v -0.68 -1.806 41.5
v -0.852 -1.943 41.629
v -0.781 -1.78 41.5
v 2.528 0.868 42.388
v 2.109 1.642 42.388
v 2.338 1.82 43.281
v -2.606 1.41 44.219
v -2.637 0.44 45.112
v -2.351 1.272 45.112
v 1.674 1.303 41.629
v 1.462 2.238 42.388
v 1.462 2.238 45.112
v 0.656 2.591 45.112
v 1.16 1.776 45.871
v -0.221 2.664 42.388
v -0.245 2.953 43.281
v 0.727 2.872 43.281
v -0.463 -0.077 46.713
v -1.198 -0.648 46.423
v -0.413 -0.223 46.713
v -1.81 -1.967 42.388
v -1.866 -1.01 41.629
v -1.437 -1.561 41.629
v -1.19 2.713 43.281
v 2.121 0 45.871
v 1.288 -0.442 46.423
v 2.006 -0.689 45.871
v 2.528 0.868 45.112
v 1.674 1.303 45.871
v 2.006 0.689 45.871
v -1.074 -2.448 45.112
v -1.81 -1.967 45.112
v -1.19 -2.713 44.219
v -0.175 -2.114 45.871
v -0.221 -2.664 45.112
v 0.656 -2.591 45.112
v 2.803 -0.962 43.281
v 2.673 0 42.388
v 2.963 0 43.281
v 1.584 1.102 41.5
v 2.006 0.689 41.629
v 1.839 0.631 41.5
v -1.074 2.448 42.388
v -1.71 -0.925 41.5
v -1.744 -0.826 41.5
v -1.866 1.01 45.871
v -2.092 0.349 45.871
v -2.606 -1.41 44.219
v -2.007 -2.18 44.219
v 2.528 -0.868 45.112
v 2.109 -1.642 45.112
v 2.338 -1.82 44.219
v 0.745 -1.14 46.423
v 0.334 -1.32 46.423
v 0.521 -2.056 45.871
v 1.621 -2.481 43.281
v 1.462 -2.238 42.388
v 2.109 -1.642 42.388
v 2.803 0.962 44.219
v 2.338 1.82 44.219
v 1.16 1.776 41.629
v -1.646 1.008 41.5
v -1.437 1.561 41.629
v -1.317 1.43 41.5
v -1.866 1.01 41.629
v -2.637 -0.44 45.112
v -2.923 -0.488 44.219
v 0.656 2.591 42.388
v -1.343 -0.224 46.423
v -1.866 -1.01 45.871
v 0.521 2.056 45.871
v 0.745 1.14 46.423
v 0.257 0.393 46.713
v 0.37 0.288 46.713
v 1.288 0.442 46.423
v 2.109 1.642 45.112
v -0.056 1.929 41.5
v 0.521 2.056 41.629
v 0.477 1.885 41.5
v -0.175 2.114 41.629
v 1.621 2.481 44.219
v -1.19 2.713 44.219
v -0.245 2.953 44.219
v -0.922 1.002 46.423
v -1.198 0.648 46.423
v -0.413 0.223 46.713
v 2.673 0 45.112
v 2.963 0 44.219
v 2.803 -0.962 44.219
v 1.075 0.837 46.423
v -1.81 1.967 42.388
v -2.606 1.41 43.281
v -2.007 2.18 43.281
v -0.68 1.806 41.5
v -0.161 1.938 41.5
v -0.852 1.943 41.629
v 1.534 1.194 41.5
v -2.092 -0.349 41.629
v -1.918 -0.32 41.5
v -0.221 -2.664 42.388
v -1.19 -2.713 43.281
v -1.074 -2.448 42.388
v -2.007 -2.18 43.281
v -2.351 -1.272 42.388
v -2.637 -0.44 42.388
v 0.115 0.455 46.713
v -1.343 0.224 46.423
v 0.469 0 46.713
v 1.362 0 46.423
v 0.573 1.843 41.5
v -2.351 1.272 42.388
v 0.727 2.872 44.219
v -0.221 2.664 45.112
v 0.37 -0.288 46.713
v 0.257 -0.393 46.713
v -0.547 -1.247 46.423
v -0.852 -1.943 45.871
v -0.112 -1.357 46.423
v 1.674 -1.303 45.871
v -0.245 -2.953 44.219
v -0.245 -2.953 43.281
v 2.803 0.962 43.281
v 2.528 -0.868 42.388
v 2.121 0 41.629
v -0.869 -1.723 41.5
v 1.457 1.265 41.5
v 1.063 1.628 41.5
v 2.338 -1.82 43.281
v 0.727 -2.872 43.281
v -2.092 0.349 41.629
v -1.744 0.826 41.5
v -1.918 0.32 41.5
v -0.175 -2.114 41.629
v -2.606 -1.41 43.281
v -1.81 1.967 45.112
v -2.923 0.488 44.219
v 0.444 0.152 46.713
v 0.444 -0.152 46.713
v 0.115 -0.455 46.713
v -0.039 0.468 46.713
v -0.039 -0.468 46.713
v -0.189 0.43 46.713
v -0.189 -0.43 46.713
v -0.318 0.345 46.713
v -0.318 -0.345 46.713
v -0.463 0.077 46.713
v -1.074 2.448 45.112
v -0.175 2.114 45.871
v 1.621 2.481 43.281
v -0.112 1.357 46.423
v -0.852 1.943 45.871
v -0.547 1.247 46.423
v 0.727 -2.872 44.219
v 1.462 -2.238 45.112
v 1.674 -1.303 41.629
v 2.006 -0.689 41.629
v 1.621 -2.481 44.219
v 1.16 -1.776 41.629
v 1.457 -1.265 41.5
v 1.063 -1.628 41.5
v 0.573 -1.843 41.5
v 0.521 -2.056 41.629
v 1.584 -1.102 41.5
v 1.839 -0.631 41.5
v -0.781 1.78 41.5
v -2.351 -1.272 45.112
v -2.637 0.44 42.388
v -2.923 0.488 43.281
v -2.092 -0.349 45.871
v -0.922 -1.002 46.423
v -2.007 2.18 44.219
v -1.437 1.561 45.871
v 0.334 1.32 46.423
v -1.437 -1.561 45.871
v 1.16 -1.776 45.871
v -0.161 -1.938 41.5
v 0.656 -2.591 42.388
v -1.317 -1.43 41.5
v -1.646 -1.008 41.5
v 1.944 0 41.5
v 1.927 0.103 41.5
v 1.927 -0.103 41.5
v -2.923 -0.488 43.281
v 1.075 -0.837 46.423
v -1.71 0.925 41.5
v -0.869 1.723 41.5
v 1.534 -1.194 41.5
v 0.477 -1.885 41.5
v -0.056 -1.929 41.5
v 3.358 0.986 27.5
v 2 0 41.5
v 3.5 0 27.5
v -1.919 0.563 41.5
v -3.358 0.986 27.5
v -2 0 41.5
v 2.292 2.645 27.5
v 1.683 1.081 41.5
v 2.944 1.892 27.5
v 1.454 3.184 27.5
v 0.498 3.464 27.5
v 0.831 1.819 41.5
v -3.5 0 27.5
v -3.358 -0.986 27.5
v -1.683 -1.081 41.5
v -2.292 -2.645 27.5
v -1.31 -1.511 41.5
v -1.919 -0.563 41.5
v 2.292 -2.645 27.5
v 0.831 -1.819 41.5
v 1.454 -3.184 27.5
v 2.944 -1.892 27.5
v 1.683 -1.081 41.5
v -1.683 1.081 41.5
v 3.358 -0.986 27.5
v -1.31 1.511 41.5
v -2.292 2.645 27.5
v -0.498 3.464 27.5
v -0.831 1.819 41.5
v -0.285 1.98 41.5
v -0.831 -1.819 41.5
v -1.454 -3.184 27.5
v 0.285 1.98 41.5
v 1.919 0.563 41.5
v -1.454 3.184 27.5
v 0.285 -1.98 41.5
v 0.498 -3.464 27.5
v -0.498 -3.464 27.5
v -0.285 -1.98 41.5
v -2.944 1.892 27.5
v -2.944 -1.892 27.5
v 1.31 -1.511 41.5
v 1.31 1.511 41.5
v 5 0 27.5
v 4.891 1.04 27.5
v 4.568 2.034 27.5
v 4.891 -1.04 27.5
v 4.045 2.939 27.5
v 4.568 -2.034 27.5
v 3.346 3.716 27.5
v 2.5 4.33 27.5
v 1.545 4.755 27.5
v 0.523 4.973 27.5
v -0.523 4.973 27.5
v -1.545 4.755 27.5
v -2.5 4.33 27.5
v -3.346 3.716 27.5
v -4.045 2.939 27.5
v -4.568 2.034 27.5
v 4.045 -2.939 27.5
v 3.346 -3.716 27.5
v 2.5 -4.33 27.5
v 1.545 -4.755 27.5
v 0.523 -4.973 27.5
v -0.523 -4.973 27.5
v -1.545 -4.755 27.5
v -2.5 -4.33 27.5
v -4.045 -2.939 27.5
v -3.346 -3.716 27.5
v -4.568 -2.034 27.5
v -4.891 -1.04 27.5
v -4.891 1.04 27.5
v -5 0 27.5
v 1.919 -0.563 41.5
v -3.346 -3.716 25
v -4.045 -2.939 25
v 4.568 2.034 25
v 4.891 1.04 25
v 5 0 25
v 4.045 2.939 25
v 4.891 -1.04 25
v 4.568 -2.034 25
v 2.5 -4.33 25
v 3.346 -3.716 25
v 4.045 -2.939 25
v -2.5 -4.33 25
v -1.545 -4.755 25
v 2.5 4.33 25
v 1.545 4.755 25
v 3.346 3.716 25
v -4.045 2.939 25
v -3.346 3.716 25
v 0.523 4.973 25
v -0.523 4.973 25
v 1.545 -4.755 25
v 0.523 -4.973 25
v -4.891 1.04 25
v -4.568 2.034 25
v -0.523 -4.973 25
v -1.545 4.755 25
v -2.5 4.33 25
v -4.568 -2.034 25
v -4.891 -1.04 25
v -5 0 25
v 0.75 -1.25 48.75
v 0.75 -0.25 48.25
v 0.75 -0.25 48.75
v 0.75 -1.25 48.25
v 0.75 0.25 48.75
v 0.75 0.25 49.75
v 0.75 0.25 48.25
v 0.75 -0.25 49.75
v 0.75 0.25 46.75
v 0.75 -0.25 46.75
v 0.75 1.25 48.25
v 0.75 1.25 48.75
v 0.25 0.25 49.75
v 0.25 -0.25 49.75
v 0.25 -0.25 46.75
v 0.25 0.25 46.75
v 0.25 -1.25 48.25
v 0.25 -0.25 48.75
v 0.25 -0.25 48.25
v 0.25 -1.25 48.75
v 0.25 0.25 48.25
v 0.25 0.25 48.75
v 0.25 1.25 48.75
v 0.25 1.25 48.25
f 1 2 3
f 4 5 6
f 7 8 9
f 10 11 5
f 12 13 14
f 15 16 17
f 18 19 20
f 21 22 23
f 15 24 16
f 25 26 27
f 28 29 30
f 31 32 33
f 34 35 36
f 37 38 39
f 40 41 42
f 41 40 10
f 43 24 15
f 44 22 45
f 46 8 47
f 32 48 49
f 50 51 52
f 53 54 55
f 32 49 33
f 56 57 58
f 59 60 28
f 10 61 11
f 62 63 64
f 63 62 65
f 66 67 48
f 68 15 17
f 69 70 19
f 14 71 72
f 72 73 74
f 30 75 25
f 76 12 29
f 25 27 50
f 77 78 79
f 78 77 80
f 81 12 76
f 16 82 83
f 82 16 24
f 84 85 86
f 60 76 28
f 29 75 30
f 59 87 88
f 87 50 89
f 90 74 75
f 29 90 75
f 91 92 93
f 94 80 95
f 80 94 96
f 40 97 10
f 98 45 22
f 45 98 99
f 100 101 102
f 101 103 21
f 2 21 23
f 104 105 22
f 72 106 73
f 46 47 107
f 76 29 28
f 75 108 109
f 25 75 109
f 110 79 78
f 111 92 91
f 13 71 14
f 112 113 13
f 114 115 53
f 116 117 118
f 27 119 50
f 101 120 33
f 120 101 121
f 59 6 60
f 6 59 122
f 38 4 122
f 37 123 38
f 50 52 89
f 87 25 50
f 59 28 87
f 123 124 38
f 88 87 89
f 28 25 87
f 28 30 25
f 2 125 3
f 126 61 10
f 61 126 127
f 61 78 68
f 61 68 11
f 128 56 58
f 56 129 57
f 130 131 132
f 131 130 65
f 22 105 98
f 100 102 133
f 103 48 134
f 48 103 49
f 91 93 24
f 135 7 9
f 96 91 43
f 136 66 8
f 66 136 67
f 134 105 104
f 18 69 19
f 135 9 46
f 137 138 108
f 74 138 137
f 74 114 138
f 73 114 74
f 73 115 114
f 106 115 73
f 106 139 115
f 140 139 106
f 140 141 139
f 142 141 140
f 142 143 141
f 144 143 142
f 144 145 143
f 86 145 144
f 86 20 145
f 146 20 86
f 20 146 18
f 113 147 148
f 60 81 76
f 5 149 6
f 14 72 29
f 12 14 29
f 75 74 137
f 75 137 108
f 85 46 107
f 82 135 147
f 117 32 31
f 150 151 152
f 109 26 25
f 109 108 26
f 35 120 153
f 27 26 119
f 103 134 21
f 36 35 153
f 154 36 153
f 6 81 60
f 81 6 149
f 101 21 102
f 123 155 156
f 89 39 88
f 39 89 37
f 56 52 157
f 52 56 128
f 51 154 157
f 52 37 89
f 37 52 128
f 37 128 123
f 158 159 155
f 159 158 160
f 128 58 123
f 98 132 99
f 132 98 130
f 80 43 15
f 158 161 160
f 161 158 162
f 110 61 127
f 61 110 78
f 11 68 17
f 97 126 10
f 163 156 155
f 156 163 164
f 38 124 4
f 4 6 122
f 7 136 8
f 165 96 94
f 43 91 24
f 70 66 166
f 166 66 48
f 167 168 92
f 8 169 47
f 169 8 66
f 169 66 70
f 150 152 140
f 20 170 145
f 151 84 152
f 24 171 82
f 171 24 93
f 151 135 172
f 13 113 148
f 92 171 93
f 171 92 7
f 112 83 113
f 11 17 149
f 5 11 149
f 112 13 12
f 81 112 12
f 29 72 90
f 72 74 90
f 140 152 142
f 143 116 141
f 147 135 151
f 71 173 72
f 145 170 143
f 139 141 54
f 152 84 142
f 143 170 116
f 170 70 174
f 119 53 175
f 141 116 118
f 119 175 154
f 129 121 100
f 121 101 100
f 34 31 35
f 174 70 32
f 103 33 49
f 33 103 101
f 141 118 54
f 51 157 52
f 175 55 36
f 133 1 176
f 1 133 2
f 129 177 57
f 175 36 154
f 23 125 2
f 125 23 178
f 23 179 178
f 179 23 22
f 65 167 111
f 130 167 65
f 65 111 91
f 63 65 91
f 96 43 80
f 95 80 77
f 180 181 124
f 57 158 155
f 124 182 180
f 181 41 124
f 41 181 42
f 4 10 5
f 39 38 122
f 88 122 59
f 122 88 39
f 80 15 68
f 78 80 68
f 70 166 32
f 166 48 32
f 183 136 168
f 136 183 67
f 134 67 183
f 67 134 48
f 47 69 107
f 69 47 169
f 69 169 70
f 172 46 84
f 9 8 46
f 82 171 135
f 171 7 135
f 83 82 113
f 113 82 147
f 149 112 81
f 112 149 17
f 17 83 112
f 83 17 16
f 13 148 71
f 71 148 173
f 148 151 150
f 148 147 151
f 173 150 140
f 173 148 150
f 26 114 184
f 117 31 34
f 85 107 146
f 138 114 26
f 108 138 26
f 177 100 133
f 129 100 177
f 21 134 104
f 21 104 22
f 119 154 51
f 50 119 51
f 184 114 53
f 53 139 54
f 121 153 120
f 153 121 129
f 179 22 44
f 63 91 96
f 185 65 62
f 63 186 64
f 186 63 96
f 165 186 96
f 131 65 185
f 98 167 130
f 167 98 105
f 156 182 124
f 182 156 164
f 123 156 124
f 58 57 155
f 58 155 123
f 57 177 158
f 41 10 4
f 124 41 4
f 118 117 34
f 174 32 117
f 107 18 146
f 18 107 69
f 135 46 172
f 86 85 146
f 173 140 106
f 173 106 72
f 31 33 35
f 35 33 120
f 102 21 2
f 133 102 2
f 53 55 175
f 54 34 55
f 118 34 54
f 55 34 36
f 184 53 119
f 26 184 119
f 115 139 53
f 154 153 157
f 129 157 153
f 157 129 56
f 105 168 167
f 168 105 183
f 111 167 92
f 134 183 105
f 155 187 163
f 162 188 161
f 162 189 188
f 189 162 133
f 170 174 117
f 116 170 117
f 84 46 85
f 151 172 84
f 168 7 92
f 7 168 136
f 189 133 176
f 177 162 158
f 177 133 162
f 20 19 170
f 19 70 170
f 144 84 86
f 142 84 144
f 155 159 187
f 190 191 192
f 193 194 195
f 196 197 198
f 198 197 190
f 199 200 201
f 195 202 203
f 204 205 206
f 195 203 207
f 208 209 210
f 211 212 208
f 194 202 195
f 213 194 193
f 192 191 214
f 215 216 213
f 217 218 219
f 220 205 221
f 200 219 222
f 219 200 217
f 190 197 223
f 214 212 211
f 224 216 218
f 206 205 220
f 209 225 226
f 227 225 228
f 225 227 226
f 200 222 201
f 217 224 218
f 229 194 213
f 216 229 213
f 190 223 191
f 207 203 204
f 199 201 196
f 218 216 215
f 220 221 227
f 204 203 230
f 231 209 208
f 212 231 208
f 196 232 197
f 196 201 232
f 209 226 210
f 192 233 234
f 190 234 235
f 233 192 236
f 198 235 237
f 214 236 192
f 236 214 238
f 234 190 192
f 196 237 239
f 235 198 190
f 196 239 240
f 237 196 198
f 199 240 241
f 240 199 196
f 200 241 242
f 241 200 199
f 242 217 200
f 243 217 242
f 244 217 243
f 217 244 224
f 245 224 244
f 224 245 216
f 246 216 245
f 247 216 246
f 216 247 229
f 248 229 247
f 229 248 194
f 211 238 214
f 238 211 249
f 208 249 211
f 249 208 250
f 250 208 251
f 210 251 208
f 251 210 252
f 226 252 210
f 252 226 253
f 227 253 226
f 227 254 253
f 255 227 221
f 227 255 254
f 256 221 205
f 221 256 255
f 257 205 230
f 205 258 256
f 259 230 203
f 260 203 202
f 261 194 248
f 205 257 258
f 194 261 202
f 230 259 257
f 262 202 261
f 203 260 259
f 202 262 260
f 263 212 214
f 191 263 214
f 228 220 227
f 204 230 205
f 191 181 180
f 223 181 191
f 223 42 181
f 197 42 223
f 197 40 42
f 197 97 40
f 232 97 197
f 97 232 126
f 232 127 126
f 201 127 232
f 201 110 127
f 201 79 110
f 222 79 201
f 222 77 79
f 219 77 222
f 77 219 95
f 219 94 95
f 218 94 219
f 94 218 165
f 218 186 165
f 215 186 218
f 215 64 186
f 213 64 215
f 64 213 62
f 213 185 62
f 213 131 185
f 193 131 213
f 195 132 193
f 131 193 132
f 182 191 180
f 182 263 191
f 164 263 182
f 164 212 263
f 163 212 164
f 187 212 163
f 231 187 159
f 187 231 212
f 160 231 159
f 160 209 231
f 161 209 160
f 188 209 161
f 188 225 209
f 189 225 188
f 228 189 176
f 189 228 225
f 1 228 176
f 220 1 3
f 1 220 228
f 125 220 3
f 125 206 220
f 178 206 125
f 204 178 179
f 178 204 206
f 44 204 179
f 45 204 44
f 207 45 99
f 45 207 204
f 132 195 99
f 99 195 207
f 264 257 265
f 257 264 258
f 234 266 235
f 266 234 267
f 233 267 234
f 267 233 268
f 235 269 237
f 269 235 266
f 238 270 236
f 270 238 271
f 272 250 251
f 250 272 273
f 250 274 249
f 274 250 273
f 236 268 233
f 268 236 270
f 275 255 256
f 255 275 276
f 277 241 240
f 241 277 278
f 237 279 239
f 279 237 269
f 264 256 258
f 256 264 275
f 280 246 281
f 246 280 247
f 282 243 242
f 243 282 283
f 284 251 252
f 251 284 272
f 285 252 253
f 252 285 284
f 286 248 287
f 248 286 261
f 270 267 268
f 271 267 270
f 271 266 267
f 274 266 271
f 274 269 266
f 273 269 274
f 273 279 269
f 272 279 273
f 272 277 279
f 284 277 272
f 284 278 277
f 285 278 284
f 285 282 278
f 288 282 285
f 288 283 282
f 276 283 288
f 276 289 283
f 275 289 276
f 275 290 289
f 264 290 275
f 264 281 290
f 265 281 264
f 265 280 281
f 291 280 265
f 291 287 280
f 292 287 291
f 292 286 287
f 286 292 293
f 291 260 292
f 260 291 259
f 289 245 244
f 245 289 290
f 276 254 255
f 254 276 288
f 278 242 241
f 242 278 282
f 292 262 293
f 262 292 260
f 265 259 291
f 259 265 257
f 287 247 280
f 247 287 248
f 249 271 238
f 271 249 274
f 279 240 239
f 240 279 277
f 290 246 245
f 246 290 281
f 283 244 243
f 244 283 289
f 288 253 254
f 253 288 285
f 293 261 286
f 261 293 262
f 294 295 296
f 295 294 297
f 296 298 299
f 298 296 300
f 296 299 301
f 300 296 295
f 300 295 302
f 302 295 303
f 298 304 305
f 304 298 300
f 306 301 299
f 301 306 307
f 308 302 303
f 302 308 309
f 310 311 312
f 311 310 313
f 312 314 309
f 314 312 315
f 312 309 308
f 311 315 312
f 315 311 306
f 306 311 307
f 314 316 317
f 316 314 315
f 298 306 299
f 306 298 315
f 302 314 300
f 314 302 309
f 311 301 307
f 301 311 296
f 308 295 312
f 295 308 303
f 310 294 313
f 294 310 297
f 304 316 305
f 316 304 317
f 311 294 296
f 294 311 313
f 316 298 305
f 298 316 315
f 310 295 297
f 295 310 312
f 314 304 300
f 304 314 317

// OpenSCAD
//король

module king() {
  scale([.5, .5, .5])
  translate ([0,0,50])
	union(){

translate ([0,0,37.5]) sphere (6);
translate ([0,0,5])cylinder (28,7,4);
translate ([0,0,0]) cylinder (5,10,10);
translate ([0.5,-0.5,43.5]) cube ([1,1,6]);
rotate ([90,0,0]) translate ([0.5,46.5,-2.5]) cube ([1,1,5]);
	}
} 

king();
